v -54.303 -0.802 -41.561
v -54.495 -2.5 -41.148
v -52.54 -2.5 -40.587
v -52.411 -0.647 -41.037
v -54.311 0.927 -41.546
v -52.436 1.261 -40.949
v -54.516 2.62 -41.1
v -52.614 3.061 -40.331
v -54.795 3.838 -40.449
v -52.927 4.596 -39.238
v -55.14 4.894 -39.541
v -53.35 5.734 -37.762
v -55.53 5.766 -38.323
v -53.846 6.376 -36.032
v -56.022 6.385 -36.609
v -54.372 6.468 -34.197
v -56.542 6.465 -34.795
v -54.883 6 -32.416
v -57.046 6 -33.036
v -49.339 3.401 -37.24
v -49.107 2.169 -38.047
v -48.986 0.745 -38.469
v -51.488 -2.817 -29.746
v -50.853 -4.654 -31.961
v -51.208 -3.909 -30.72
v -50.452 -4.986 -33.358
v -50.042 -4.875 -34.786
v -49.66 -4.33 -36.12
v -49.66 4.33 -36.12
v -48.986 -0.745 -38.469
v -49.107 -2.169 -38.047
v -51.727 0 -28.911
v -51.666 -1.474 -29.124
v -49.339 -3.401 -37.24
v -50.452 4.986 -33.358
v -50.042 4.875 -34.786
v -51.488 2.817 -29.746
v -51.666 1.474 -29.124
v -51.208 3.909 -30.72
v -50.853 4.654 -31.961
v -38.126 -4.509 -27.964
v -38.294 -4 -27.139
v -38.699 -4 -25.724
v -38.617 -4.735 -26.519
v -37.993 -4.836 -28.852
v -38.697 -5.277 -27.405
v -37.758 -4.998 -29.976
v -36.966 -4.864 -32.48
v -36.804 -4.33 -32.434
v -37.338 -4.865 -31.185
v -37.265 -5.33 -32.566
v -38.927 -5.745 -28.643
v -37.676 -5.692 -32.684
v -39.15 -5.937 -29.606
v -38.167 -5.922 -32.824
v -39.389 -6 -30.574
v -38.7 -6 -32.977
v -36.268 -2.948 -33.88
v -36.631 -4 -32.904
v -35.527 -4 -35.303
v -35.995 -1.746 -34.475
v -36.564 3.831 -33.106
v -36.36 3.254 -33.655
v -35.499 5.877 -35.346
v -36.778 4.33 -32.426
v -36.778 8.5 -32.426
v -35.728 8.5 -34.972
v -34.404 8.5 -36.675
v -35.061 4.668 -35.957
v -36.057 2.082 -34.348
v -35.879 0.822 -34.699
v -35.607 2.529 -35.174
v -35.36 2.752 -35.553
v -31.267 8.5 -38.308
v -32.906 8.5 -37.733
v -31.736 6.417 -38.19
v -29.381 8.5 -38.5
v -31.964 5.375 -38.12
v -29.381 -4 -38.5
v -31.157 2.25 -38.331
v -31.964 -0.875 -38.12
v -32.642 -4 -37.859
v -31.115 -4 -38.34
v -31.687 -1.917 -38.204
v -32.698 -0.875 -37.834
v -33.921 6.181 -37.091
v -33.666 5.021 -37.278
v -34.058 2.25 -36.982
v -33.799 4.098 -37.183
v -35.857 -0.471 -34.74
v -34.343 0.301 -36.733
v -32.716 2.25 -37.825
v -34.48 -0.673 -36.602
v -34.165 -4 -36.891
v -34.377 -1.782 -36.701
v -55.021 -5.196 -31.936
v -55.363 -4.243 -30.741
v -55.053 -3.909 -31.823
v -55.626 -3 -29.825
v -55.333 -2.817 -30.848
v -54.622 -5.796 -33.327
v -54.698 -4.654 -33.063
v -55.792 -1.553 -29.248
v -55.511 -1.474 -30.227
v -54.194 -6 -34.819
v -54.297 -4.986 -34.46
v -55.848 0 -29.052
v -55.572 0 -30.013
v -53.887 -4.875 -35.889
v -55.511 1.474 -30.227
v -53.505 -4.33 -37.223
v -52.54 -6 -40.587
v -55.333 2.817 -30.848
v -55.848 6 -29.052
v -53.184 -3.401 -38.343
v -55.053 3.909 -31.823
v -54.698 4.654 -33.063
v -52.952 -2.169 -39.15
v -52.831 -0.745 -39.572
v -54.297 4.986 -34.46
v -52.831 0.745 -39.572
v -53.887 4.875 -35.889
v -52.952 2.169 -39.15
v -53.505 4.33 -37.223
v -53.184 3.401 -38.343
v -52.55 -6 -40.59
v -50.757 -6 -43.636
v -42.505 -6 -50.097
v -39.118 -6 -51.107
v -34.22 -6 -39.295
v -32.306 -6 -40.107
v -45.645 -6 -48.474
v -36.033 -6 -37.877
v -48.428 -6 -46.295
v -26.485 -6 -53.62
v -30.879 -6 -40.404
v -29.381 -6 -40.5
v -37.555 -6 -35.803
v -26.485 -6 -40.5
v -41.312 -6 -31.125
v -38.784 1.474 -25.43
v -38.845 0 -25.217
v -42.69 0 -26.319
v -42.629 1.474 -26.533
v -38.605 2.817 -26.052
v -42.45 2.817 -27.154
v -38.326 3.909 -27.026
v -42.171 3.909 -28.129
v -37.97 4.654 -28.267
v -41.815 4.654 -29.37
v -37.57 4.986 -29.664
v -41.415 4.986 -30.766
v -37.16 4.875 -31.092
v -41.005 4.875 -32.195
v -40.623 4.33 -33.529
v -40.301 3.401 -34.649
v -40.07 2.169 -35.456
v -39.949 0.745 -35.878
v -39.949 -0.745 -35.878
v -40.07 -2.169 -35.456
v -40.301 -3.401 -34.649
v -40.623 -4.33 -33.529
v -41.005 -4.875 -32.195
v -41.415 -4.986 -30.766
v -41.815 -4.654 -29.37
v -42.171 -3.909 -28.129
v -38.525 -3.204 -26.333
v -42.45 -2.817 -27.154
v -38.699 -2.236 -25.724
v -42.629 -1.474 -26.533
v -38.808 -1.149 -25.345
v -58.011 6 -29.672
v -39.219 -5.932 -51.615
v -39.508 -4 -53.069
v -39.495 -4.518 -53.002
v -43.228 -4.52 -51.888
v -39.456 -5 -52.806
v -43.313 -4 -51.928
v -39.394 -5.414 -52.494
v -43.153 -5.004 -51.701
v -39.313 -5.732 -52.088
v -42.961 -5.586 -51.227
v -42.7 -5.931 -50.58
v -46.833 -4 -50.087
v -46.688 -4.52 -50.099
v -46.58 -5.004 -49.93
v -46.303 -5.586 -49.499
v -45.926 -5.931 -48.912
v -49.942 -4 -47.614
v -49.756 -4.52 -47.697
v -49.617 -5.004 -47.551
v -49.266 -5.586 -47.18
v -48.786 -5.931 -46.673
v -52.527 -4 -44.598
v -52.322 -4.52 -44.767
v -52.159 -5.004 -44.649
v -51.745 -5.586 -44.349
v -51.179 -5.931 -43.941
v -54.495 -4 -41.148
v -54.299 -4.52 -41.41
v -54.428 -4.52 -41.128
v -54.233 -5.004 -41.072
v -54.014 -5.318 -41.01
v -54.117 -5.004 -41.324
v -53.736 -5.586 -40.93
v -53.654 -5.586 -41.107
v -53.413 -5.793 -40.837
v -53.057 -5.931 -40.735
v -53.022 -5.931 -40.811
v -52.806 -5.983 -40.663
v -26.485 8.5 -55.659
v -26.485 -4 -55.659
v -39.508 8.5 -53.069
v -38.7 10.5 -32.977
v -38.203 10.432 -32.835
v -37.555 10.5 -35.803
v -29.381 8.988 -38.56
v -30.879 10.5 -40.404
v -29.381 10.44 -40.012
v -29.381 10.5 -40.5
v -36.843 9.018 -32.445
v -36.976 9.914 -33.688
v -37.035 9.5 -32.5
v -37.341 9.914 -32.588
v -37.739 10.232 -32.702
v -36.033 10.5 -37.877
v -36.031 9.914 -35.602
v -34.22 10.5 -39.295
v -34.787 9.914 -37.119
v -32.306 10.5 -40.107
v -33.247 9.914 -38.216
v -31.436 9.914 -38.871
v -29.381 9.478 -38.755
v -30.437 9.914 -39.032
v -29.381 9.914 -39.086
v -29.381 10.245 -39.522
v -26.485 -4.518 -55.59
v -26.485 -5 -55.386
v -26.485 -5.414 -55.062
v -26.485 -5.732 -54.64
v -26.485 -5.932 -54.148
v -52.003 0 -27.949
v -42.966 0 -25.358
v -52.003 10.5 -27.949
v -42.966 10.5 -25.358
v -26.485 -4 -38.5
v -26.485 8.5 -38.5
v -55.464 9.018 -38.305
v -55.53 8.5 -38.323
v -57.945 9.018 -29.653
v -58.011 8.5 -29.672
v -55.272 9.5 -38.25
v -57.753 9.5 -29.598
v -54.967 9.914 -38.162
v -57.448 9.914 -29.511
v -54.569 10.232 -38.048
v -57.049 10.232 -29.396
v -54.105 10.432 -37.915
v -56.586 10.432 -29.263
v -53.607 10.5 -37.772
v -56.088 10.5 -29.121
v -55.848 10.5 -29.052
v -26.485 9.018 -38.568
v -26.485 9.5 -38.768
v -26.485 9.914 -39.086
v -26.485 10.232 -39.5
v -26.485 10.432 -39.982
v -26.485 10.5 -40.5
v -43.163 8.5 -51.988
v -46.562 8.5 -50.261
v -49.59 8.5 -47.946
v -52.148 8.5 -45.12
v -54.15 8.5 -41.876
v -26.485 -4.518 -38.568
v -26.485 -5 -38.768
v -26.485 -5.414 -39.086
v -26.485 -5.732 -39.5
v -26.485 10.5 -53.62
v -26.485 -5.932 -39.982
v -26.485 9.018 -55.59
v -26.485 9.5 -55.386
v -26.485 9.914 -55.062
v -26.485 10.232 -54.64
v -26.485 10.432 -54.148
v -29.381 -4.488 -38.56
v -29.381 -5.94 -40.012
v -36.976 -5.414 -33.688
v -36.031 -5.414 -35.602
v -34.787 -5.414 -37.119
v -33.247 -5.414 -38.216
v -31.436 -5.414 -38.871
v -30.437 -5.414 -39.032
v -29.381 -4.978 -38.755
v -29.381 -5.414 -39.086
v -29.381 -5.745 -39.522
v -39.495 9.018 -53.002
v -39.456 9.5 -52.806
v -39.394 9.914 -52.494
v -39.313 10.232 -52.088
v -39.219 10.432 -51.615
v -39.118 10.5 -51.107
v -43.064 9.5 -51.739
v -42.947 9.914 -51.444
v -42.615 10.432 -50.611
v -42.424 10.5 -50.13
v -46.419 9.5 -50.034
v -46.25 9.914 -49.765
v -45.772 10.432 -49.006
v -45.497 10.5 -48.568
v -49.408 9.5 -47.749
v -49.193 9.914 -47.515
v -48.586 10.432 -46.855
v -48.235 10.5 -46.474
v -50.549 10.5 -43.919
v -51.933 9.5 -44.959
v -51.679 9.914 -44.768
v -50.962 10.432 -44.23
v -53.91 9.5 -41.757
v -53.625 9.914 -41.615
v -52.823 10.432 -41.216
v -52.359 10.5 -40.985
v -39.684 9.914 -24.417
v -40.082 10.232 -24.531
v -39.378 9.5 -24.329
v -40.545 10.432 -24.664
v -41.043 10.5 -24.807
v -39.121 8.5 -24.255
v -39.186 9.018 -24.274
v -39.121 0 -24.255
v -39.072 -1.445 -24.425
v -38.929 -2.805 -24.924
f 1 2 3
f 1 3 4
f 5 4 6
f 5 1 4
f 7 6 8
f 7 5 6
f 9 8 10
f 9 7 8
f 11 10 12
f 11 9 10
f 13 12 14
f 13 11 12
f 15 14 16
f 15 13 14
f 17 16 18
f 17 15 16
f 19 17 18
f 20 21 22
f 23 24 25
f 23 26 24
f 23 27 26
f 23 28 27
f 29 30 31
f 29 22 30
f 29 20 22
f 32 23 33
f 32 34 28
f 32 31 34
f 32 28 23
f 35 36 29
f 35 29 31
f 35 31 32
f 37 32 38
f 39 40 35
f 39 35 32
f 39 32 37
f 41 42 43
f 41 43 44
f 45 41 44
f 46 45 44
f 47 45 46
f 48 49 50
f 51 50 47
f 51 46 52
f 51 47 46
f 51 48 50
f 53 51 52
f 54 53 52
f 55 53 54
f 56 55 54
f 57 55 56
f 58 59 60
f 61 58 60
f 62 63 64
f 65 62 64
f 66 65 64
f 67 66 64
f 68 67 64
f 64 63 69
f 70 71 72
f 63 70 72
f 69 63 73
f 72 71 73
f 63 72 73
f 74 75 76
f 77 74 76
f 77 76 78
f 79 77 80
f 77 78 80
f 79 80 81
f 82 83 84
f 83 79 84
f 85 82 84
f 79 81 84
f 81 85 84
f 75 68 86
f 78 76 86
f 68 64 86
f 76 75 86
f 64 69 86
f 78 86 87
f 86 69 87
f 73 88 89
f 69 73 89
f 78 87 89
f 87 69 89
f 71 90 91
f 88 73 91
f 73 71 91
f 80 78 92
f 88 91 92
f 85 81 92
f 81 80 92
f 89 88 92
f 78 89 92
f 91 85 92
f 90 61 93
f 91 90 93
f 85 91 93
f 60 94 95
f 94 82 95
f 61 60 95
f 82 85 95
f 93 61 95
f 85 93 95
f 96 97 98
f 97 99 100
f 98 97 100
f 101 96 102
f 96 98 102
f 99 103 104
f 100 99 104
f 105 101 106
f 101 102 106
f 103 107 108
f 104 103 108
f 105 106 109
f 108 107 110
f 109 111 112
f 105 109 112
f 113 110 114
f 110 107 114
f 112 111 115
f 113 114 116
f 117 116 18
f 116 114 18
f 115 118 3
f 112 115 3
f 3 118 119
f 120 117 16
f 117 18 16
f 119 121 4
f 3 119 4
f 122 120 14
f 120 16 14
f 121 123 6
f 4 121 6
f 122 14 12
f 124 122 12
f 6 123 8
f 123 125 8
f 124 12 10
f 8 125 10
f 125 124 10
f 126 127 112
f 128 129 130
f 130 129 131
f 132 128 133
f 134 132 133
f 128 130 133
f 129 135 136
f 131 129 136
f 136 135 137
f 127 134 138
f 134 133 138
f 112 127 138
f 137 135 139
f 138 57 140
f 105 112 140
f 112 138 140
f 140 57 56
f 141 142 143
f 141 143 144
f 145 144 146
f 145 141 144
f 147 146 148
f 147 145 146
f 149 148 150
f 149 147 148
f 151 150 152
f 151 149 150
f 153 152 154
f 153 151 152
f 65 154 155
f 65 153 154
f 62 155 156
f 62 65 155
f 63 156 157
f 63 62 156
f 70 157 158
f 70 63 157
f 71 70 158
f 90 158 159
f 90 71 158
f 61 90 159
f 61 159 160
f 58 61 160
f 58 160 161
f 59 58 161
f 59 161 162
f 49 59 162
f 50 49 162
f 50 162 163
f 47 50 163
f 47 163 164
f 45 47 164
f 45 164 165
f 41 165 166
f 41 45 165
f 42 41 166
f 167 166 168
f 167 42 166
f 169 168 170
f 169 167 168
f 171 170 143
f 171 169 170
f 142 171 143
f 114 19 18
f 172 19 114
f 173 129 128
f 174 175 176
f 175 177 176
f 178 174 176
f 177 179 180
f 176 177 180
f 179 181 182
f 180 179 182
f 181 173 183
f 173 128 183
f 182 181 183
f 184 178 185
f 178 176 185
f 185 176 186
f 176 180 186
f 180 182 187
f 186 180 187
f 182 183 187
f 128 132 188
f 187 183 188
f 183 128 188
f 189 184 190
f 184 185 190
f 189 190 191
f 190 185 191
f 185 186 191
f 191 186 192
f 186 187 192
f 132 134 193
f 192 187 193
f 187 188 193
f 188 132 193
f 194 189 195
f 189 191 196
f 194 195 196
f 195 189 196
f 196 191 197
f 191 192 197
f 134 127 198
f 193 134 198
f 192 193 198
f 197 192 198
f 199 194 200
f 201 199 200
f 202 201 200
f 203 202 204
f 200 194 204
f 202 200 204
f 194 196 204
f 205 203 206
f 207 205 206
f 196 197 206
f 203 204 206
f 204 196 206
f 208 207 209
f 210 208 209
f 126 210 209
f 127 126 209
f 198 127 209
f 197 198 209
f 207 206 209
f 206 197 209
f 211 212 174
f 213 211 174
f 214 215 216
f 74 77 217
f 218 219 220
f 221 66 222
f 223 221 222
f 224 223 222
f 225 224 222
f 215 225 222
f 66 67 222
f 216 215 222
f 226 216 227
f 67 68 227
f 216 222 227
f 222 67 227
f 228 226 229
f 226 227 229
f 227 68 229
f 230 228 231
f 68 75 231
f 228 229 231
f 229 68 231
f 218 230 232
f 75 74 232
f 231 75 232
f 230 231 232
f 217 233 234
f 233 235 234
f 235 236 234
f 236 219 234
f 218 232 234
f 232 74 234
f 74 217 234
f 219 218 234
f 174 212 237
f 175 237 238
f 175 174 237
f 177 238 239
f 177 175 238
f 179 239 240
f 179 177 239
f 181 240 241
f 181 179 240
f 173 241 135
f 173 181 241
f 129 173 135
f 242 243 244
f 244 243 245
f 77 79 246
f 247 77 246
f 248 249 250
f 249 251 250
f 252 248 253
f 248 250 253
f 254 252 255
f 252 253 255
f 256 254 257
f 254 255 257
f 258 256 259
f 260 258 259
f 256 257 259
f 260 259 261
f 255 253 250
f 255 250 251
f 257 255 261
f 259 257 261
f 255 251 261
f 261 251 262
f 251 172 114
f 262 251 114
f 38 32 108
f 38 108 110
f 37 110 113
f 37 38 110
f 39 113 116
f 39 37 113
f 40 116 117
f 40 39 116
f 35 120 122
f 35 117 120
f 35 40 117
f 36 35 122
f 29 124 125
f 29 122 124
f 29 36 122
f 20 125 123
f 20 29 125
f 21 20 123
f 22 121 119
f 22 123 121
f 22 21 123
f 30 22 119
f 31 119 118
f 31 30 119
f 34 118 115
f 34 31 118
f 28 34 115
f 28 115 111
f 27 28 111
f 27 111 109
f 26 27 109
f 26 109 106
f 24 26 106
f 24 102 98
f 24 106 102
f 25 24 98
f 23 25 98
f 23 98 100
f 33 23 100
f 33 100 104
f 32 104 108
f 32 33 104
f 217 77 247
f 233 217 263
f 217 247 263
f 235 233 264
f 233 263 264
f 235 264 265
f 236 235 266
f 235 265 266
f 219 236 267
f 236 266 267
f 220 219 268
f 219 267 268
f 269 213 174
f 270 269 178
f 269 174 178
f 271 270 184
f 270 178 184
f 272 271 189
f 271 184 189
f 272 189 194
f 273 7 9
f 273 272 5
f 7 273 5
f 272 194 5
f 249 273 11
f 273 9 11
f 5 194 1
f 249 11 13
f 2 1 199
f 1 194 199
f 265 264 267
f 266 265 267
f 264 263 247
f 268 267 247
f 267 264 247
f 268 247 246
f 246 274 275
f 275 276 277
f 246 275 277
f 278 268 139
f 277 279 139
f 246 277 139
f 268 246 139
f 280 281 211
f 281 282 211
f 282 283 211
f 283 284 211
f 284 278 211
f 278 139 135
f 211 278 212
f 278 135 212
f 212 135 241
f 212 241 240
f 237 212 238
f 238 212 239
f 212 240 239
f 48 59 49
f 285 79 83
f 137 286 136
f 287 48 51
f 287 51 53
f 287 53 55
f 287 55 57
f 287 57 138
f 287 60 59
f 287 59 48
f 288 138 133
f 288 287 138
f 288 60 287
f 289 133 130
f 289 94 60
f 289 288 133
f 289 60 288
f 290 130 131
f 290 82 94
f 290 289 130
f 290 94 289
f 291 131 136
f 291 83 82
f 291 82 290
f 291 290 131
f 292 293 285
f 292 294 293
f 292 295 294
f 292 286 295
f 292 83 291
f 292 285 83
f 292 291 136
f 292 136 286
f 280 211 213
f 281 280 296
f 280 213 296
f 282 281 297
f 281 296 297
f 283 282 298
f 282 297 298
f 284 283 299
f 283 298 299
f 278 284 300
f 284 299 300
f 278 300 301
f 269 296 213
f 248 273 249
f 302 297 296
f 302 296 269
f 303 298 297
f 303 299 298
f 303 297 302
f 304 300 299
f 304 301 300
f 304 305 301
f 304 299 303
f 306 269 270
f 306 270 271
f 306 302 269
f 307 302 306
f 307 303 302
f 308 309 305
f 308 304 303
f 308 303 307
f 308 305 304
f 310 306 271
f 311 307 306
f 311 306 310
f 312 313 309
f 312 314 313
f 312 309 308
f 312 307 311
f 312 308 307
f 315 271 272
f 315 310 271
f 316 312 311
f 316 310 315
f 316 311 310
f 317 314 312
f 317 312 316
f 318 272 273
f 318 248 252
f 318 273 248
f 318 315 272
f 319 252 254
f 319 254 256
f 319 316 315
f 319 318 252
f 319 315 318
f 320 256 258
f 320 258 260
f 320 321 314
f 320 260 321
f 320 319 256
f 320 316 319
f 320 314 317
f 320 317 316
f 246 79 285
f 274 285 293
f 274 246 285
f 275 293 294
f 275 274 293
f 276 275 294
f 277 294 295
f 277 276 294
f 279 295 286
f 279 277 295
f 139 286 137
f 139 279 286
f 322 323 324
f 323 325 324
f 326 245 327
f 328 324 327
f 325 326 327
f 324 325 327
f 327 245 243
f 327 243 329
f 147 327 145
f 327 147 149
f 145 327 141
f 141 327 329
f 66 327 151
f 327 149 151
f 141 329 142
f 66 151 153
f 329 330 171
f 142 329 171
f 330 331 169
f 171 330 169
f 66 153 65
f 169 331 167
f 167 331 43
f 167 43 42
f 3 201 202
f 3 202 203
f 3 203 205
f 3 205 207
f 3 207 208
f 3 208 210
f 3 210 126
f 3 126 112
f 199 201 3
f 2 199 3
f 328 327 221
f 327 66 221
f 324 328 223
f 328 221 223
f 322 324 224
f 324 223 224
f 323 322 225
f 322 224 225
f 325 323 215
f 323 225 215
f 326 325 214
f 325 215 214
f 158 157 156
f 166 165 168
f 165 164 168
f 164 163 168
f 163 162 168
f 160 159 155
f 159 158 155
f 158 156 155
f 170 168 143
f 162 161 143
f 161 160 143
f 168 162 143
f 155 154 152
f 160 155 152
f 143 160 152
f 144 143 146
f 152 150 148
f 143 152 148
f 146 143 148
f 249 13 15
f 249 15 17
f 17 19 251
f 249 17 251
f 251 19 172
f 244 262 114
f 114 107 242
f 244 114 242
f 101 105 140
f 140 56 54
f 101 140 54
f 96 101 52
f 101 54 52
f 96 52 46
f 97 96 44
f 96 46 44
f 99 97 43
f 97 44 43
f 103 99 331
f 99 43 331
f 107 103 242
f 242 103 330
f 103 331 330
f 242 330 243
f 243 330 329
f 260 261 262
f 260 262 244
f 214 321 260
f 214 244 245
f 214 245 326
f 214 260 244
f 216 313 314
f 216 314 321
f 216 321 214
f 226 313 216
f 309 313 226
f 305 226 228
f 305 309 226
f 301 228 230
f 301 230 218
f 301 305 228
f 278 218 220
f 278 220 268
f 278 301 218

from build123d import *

# Parameters (mm, degrees)
EXTRUDE_1_DEPTH          = 10.5
EXTRUDE_1_DEPTH_BACK     = 6
FILLET_1_R               = 2
CUT_EXTRUDE_1_DEPTH      = 51.301816014
CUT_EXTRUDE_1_DEPTH_BACK = 51.301816014
SKETCH_2_R               = 5
CUT_EXTRUDE_2_DEPTH      = 2.25
EXTRUDE_3_DEPTH          = 9.401473572


with BuildPart() as part:
    # Эскиз1 → Бобышка-Вытянуть1 (new, two sides: drawn at the far end of the back side and taken through both)
    with BuildSketch(Plane(origin=(0, 0, 0), x_dir=(1, 0, 0), z_dir=(0, 1, 0)).offset(-EXTRUDE_1_DEPTH_BACK)):
        with BuildLine():
            Line((-26.485281374, 38.5), (-26.485281374, 55.65945007))
            Line((-26.485281374, 55.65945007), (-39.508260541, 53.069018453))
            ThreePointArc((-39.508260541, 53.069018453), (-49.589786713, 47.94606891), (-55.52997461, 38.323389984))
            Line((-55.52997461, 38.323389984), (-58.010710812, 29.67203472))
            Line((-58.010710812, 29.67203472), (-55.847871996, 29.05185067))
            Line((-55.847871996, 29.05185067), (-52.002825213, 27.949301246))
            Line((-52.002825213, 27.949301246), (-48.695176943, 39.484441598))
            Line((-48.695176943, 39.484441598), (-39.657900512, 36.893044281))
            Line((-39.657900512, 36.893044281), (-42.965548782, 25.35790393))
            Line((-42.965548782, 25.35790393), (-39.120501998, 24.255354507))
            Line((-39.120501998, 24.255354507), (-36.777584474, 32.426078922))
            add(Edge.make_bspline(
                [(-36.777584474, 32.426078922), (-35.035915631, 38.5), (-29.380741372, 38.5)],
                knots=[0, 0, 0, 1, 1, 1], degree=2))
            Line((-29.380741372, 38.5), (-26.485281374, 38.5))
        make_face()
    extrude(amount=EXTRUDE_1_DEPTH + EXTRUDE_1_DEPTH_BACK)

    # Скругление1
    fillet_1_edges = [part.edges().sort_by_distance(p)[0] for p in [
        (-34.198352133, 10.5, -36.862455815),
        (-27.933011373, 10.5, -38.5),
        (-32.996770958, 10.5, -54.364234261),
        (-49.589786713, 10.5, -47.94606891),
        (-37.949043236, -6, -28.340716715),
        (-56.770342711, -6, -33.997712352),
        (-56.770342711, 10.5, -33.997712352),
        (-49.589786713, -6, -47.94606891),
        (-32.996770958, -6, -54.364234261),
        (-27.933011373, -6, -38.5),
        (-34.198352133, -6, -36.862455815),
        (-37.949043236, 10.5, -28.340716715),
    ]]
    fillet(fillet_1_edges, radius=FILLET_1_R)

    # Эскиз2 → Вырез-Вытянуть1 (cut, two sides: drawn at the far end of the back side and taken through both)
    with BuildSketch(Plane(origin=(-55.457297641, 0, -15.902124205), x_dir=(-0.27563735581600457, 0, 0.9612616959386041), z_dir=(-0.9612616959386041, 0, -0.27563735581600457)).offset(-CUT_EXTRUDE_1_DEPTH_BACK)):
        with BuildLine():
            Line((-18.53267148, -6), (-12.53267148, -6))
            Line((-12.53267148, -6), (-12.53267148, 0))
            ThreePointArc((-12.53267148, 0), (-14.290030793, -4.242640687), (-18.53267148, -6))
        make_face()
        with Locations((-18.53267148, 0)):
            Circle(SKETCH_2_R)
    extrude(amount=CUT_EXTRUDE_1_DEPTH + CUT_EXTRUDE_1_DEPTH_BACK, mode=Mode.SUBTRACT)

    # Эскиз4 → Вырез-Вытянуть2 (cut)
    with BuildSketch(Plane(origin=(-61.46518324, 0, -17.624857679), x_dir=(-0.2756373558160068, 0, 0.9612616959386036), z_dir=(-0.9612616959386036, 0, -0.2756373558160068))):
        with BuildLine():
            Line((-16.03267148, 6), (-12.53267148, 6))
            Line((-12.53267148, 6), (-12.53267148, 2.5))
            Line((-12.53267148, 2.5), (-12.53267148, -6))
            Line((-12.53267148, -6), (-21.032671479, -6))
            Line((-21.032671479, -6), (-24.53267148, -6))
            Line((-24.53267148, -6), (-24.53267148, -2.499999999))
            ThreePointArc((-24.53267148, -2.499999999), (-23.128865557, 4.596194078), (-16.03267148, 6))
        make_face()
    extrude(amount=-CUT_EXTRUDE_2_DEPTH, mode=Mode.SUBTRACT)

    # Эскиз5 → Бобышка-Вытянуть3 (add)
    with BuildSketch(Plane(origin=(-46.42002121, 0, -13.310726889), x_dir=(-0.2756373558157037, 0, 0.9612616959386904), z_dir=(-0.9612616959386904, 0, -0.2756373558157037))):
        with BuildLine():
            Line((-24.53267148, 10.5), (-24.53267148, -6))
            Line((-24.53267148, -6), (-18.53267148, -6))
            ThreePointArc((-18.53267148, -6), (-14.290030793, -4.242640687), (-12.53267148, 0))
            Line((-12.53267148, 0), (-12.53267148, 10.5))
            Line((-12.53267148, 10.5), (-24.53267148, 10.5))
        make_face()
    extrude(amount=EXTRUDE_3_DEPTH)


solid = part.part
